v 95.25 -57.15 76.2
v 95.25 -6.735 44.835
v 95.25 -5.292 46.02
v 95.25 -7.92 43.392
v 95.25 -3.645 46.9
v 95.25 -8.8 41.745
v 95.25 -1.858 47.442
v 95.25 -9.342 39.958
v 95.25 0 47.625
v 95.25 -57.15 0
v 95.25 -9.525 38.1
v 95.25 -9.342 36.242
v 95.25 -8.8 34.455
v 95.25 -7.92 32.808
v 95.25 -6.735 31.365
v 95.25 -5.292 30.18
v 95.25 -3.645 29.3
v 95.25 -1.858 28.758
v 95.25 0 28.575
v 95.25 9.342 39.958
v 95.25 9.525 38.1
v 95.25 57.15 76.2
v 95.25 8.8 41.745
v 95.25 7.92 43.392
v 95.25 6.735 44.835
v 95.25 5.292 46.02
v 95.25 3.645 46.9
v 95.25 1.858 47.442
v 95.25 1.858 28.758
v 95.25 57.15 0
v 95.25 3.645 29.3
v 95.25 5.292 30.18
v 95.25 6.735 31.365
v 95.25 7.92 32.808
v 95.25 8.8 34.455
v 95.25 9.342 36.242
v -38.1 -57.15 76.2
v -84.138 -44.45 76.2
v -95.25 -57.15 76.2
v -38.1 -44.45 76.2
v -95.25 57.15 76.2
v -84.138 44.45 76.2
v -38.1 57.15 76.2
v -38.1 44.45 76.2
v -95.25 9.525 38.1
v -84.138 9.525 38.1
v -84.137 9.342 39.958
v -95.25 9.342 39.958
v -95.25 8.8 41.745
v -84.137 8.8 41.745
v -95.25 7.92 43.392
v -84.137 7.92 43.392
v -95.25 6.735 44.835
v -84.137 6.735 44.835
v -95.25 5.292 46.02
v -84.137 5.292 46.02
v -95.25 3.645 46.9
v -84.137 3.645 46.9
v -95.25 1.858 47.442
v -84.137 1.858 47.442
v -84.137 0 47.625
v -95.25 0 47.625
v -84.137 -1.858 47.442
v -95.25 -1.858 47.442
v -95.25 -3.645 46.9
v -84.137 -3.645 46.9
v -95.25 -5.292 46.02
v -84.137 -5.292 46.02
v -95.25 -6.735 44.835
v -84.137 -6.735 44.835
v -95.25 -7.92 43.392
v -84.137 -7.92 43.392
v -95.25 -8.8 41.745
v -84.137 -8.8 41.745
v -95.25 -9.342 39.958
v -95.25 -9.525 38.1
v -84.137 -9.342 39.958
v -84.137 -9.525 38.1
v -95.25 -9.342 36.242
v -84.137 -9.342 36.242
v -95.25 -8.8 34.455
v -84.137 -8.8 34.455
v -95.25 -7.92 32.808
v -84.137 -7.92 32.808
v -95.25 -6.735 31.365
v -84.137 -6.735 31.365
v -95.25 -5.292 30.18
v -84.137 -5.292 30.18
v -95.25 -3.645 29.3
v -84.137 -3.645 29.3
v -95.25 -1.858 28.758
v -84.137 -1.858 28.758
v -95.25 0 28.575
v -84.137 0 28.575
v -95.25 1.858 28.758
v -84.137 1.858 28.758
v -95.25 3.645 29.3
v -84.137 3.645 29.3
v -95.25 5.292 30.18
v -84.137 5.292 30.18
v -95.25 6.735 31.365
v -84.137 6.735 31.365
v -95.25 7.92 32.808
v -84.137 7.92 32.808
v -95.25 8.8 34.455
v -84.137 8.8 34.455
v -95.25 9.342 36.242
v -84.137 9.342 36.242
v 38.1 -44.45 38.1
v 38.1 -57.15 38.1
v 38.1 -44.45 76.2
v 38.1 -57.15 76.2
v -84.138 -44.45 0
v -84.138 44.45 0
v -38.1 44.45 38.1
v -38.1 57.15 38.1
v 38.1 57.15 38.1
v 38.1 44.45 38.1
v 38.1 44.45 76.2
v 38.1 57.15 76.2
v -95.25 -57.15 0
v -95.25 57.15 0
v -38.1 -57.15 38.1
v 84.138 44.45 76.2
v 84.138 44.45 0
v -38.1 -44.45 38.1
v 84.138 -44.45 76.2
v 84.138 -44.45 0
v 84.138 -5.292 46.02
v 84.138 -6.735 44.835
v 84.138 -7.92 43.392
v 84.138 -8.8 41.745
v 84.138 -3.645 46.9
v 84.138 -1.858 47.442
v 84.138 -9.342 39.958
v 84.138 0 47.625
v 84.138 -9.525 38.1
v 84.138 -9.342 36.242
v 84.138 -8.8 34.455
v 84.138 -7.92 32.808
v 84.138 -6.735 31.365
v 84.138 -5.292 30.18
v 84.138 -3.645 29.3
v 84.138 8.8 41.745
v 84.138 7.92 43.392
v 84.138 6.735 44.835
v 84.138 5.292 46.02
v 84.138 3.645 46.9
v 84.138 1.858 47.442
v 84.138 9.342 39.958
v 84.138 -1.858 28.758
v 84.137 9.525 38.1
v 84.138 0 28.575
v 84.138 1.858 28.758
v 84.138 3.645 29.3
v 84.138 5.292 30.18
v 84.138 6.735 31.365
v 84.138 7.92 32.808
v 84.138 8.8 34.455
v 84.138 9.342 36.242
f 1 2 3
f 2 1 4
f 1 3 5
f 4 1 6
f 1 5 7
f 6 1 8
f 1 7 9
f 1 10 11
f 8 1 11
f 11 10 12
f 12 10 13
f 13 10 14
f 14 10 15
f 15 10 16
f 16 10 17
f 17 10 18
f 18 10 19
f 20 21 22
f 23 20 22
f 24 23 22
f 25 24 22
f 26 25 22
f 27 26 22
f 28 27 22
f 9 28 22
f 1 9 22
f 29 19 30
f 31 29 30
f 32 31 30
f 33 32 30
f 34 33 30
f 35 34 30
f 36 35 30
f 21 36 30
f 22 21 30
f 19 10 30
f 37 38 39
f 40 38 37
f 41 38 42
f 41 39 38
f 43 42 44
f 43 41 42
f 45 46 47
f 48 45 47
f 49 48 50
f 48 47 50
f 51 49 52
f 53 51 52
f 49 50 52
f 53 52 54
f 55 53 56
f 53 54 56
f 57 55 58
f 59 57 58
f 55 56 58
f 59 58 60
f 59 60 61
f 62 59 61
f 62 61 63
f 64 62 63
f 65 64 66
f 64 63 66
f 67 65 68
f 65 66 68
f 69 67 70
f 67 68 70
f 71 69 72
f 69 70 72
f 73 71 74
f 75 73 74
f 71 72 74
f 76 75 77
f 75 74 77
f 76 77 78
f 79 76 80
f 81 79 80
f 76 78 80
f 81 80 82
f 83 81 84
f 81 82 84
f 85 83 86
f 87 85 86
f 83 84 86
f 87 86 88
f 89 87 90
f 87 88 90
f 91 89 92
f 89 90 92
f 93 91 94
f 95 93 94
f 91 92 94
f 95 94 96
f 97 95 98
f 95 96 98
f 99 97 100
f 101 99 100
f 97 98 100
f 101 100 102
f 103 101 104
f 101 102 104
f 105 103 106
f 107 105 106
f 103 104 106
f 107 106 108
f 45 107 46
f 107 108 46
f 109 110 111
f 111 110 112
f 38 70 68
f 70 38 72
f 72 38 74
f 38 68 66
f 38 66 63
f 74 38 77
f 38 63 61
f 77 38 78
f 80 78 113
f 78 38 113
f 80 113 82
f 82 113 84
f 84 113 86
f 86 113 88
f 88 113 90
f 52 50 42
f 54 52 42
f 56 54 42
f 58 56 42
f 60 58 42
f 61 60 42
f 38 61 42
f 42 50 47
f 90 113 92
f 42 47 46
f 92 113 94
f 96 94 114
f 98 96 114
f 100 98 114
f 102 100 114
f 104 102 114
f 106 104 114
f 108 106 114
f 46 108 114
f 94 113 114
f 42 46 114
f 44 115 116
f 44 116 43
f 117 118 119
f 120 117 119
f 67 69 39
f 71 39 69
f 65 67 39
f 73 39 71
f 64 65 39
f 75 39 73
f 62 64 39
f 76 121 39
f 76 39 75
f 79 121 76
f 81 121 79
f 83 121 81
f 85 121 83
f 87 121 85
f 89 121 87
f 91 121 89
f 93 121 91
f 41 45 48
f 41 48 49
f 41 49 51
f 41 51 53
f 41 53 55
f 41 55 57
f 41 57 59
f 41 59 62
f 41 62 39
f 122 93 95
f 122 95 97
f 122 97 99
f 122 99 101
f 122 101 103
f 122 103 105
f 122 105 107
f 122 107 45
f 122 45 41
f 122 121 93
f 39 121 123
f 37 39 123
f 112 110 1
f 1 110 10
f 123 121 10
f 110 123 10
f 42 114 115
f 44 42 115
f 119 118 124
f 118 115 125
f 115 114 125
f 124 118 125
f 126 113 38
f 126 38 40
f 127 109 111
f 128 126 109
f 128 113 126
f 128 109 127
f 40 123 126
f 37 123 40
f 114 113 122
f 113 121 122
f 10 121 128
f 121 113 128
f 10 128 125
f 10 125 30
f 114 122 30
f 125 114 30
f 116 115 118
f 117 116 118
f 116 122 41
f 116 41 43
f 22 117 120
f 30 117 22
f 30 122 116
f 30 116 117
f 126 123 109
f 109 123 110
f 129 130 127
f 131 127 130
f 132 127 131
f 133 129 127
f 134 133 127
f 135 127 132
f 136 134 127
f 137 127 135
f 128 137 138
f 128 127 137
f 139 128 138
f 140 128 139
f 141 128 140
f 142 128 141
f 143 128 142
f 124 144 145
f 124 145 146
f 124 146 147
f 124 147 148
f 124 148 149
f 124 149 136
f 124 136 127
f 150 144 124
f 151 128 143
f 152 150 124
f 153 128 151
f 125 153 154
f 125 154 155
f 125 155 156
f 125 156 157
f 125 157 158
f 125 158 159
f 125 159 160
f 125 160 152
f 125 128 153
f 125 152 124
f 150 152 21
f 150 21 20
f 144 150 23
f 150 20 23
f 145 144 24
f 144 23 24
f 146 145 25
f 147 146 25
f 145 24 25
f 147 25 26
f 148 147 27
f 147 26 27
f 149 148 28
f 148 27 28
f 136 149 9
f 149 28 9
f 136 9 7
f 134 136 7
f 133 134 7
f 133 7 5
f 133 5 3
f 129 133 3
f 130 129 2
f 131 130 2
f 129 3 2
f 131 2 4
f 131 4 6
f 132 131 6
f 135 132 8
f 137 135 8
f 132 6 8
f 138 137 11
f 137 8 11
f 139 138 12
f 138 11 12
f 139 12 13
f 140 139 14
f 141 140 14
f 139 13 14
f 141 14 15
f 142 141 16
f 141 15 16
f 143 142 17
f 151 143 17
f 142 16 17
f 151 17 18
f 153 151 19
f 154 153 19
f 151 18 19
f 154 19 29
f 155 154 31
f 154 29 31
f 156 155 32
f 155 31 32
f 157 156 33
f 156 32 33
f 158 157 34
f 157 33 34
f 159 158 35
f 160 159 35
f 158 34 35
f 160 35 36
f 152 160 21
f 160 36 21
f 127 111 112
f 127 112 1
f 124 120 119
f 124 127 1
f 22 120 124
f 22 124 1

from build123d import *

# Parameters (mm, degrees)
F0_W     = 190.5
F0_H     = 114.3
F0_W_2   = 168.275
F0_H_2   = 88.9
F1_DEPTH = 76.2
F2_W     = 76.2
F2_H     = 76.2
F3_DEPTH = 190.5
F4_R     = 9.525
F5_DEPTH = 190.5


with BuildPart() as f1:
    # F0 (on Top) → F1 (new body)
    with BuildSketch(Plane.XY):
        Rectangle(F0_W, F0_H)
        Rectangle(F0_W_2, F0_H_2, mode=Mode.SUBTRACT)
    extrude(amount=F1_DEPTH)

    # F2 (on face) → F3 (cut, symmetric)
    with BuildSketch(Plane.XZ.offset(57.15)):
        with Locations((0, 76.2)):
            Rectangle(F2_W, F2_H)
    extrude(amount=F3_DEPTH, both=True, mode=Mode.SUBTRACT)

    # F4 (on face) → F5 (cut, symmetric)
    with BuildSketch(Plane.YZ.offset(95.25)):
        with Locations((0, 38.1)):
            Circle(F4_R)
    extrude(amount=F5_DEPTH, both=True, mode=Mode.SUBTRACT)


solid = f1.part
